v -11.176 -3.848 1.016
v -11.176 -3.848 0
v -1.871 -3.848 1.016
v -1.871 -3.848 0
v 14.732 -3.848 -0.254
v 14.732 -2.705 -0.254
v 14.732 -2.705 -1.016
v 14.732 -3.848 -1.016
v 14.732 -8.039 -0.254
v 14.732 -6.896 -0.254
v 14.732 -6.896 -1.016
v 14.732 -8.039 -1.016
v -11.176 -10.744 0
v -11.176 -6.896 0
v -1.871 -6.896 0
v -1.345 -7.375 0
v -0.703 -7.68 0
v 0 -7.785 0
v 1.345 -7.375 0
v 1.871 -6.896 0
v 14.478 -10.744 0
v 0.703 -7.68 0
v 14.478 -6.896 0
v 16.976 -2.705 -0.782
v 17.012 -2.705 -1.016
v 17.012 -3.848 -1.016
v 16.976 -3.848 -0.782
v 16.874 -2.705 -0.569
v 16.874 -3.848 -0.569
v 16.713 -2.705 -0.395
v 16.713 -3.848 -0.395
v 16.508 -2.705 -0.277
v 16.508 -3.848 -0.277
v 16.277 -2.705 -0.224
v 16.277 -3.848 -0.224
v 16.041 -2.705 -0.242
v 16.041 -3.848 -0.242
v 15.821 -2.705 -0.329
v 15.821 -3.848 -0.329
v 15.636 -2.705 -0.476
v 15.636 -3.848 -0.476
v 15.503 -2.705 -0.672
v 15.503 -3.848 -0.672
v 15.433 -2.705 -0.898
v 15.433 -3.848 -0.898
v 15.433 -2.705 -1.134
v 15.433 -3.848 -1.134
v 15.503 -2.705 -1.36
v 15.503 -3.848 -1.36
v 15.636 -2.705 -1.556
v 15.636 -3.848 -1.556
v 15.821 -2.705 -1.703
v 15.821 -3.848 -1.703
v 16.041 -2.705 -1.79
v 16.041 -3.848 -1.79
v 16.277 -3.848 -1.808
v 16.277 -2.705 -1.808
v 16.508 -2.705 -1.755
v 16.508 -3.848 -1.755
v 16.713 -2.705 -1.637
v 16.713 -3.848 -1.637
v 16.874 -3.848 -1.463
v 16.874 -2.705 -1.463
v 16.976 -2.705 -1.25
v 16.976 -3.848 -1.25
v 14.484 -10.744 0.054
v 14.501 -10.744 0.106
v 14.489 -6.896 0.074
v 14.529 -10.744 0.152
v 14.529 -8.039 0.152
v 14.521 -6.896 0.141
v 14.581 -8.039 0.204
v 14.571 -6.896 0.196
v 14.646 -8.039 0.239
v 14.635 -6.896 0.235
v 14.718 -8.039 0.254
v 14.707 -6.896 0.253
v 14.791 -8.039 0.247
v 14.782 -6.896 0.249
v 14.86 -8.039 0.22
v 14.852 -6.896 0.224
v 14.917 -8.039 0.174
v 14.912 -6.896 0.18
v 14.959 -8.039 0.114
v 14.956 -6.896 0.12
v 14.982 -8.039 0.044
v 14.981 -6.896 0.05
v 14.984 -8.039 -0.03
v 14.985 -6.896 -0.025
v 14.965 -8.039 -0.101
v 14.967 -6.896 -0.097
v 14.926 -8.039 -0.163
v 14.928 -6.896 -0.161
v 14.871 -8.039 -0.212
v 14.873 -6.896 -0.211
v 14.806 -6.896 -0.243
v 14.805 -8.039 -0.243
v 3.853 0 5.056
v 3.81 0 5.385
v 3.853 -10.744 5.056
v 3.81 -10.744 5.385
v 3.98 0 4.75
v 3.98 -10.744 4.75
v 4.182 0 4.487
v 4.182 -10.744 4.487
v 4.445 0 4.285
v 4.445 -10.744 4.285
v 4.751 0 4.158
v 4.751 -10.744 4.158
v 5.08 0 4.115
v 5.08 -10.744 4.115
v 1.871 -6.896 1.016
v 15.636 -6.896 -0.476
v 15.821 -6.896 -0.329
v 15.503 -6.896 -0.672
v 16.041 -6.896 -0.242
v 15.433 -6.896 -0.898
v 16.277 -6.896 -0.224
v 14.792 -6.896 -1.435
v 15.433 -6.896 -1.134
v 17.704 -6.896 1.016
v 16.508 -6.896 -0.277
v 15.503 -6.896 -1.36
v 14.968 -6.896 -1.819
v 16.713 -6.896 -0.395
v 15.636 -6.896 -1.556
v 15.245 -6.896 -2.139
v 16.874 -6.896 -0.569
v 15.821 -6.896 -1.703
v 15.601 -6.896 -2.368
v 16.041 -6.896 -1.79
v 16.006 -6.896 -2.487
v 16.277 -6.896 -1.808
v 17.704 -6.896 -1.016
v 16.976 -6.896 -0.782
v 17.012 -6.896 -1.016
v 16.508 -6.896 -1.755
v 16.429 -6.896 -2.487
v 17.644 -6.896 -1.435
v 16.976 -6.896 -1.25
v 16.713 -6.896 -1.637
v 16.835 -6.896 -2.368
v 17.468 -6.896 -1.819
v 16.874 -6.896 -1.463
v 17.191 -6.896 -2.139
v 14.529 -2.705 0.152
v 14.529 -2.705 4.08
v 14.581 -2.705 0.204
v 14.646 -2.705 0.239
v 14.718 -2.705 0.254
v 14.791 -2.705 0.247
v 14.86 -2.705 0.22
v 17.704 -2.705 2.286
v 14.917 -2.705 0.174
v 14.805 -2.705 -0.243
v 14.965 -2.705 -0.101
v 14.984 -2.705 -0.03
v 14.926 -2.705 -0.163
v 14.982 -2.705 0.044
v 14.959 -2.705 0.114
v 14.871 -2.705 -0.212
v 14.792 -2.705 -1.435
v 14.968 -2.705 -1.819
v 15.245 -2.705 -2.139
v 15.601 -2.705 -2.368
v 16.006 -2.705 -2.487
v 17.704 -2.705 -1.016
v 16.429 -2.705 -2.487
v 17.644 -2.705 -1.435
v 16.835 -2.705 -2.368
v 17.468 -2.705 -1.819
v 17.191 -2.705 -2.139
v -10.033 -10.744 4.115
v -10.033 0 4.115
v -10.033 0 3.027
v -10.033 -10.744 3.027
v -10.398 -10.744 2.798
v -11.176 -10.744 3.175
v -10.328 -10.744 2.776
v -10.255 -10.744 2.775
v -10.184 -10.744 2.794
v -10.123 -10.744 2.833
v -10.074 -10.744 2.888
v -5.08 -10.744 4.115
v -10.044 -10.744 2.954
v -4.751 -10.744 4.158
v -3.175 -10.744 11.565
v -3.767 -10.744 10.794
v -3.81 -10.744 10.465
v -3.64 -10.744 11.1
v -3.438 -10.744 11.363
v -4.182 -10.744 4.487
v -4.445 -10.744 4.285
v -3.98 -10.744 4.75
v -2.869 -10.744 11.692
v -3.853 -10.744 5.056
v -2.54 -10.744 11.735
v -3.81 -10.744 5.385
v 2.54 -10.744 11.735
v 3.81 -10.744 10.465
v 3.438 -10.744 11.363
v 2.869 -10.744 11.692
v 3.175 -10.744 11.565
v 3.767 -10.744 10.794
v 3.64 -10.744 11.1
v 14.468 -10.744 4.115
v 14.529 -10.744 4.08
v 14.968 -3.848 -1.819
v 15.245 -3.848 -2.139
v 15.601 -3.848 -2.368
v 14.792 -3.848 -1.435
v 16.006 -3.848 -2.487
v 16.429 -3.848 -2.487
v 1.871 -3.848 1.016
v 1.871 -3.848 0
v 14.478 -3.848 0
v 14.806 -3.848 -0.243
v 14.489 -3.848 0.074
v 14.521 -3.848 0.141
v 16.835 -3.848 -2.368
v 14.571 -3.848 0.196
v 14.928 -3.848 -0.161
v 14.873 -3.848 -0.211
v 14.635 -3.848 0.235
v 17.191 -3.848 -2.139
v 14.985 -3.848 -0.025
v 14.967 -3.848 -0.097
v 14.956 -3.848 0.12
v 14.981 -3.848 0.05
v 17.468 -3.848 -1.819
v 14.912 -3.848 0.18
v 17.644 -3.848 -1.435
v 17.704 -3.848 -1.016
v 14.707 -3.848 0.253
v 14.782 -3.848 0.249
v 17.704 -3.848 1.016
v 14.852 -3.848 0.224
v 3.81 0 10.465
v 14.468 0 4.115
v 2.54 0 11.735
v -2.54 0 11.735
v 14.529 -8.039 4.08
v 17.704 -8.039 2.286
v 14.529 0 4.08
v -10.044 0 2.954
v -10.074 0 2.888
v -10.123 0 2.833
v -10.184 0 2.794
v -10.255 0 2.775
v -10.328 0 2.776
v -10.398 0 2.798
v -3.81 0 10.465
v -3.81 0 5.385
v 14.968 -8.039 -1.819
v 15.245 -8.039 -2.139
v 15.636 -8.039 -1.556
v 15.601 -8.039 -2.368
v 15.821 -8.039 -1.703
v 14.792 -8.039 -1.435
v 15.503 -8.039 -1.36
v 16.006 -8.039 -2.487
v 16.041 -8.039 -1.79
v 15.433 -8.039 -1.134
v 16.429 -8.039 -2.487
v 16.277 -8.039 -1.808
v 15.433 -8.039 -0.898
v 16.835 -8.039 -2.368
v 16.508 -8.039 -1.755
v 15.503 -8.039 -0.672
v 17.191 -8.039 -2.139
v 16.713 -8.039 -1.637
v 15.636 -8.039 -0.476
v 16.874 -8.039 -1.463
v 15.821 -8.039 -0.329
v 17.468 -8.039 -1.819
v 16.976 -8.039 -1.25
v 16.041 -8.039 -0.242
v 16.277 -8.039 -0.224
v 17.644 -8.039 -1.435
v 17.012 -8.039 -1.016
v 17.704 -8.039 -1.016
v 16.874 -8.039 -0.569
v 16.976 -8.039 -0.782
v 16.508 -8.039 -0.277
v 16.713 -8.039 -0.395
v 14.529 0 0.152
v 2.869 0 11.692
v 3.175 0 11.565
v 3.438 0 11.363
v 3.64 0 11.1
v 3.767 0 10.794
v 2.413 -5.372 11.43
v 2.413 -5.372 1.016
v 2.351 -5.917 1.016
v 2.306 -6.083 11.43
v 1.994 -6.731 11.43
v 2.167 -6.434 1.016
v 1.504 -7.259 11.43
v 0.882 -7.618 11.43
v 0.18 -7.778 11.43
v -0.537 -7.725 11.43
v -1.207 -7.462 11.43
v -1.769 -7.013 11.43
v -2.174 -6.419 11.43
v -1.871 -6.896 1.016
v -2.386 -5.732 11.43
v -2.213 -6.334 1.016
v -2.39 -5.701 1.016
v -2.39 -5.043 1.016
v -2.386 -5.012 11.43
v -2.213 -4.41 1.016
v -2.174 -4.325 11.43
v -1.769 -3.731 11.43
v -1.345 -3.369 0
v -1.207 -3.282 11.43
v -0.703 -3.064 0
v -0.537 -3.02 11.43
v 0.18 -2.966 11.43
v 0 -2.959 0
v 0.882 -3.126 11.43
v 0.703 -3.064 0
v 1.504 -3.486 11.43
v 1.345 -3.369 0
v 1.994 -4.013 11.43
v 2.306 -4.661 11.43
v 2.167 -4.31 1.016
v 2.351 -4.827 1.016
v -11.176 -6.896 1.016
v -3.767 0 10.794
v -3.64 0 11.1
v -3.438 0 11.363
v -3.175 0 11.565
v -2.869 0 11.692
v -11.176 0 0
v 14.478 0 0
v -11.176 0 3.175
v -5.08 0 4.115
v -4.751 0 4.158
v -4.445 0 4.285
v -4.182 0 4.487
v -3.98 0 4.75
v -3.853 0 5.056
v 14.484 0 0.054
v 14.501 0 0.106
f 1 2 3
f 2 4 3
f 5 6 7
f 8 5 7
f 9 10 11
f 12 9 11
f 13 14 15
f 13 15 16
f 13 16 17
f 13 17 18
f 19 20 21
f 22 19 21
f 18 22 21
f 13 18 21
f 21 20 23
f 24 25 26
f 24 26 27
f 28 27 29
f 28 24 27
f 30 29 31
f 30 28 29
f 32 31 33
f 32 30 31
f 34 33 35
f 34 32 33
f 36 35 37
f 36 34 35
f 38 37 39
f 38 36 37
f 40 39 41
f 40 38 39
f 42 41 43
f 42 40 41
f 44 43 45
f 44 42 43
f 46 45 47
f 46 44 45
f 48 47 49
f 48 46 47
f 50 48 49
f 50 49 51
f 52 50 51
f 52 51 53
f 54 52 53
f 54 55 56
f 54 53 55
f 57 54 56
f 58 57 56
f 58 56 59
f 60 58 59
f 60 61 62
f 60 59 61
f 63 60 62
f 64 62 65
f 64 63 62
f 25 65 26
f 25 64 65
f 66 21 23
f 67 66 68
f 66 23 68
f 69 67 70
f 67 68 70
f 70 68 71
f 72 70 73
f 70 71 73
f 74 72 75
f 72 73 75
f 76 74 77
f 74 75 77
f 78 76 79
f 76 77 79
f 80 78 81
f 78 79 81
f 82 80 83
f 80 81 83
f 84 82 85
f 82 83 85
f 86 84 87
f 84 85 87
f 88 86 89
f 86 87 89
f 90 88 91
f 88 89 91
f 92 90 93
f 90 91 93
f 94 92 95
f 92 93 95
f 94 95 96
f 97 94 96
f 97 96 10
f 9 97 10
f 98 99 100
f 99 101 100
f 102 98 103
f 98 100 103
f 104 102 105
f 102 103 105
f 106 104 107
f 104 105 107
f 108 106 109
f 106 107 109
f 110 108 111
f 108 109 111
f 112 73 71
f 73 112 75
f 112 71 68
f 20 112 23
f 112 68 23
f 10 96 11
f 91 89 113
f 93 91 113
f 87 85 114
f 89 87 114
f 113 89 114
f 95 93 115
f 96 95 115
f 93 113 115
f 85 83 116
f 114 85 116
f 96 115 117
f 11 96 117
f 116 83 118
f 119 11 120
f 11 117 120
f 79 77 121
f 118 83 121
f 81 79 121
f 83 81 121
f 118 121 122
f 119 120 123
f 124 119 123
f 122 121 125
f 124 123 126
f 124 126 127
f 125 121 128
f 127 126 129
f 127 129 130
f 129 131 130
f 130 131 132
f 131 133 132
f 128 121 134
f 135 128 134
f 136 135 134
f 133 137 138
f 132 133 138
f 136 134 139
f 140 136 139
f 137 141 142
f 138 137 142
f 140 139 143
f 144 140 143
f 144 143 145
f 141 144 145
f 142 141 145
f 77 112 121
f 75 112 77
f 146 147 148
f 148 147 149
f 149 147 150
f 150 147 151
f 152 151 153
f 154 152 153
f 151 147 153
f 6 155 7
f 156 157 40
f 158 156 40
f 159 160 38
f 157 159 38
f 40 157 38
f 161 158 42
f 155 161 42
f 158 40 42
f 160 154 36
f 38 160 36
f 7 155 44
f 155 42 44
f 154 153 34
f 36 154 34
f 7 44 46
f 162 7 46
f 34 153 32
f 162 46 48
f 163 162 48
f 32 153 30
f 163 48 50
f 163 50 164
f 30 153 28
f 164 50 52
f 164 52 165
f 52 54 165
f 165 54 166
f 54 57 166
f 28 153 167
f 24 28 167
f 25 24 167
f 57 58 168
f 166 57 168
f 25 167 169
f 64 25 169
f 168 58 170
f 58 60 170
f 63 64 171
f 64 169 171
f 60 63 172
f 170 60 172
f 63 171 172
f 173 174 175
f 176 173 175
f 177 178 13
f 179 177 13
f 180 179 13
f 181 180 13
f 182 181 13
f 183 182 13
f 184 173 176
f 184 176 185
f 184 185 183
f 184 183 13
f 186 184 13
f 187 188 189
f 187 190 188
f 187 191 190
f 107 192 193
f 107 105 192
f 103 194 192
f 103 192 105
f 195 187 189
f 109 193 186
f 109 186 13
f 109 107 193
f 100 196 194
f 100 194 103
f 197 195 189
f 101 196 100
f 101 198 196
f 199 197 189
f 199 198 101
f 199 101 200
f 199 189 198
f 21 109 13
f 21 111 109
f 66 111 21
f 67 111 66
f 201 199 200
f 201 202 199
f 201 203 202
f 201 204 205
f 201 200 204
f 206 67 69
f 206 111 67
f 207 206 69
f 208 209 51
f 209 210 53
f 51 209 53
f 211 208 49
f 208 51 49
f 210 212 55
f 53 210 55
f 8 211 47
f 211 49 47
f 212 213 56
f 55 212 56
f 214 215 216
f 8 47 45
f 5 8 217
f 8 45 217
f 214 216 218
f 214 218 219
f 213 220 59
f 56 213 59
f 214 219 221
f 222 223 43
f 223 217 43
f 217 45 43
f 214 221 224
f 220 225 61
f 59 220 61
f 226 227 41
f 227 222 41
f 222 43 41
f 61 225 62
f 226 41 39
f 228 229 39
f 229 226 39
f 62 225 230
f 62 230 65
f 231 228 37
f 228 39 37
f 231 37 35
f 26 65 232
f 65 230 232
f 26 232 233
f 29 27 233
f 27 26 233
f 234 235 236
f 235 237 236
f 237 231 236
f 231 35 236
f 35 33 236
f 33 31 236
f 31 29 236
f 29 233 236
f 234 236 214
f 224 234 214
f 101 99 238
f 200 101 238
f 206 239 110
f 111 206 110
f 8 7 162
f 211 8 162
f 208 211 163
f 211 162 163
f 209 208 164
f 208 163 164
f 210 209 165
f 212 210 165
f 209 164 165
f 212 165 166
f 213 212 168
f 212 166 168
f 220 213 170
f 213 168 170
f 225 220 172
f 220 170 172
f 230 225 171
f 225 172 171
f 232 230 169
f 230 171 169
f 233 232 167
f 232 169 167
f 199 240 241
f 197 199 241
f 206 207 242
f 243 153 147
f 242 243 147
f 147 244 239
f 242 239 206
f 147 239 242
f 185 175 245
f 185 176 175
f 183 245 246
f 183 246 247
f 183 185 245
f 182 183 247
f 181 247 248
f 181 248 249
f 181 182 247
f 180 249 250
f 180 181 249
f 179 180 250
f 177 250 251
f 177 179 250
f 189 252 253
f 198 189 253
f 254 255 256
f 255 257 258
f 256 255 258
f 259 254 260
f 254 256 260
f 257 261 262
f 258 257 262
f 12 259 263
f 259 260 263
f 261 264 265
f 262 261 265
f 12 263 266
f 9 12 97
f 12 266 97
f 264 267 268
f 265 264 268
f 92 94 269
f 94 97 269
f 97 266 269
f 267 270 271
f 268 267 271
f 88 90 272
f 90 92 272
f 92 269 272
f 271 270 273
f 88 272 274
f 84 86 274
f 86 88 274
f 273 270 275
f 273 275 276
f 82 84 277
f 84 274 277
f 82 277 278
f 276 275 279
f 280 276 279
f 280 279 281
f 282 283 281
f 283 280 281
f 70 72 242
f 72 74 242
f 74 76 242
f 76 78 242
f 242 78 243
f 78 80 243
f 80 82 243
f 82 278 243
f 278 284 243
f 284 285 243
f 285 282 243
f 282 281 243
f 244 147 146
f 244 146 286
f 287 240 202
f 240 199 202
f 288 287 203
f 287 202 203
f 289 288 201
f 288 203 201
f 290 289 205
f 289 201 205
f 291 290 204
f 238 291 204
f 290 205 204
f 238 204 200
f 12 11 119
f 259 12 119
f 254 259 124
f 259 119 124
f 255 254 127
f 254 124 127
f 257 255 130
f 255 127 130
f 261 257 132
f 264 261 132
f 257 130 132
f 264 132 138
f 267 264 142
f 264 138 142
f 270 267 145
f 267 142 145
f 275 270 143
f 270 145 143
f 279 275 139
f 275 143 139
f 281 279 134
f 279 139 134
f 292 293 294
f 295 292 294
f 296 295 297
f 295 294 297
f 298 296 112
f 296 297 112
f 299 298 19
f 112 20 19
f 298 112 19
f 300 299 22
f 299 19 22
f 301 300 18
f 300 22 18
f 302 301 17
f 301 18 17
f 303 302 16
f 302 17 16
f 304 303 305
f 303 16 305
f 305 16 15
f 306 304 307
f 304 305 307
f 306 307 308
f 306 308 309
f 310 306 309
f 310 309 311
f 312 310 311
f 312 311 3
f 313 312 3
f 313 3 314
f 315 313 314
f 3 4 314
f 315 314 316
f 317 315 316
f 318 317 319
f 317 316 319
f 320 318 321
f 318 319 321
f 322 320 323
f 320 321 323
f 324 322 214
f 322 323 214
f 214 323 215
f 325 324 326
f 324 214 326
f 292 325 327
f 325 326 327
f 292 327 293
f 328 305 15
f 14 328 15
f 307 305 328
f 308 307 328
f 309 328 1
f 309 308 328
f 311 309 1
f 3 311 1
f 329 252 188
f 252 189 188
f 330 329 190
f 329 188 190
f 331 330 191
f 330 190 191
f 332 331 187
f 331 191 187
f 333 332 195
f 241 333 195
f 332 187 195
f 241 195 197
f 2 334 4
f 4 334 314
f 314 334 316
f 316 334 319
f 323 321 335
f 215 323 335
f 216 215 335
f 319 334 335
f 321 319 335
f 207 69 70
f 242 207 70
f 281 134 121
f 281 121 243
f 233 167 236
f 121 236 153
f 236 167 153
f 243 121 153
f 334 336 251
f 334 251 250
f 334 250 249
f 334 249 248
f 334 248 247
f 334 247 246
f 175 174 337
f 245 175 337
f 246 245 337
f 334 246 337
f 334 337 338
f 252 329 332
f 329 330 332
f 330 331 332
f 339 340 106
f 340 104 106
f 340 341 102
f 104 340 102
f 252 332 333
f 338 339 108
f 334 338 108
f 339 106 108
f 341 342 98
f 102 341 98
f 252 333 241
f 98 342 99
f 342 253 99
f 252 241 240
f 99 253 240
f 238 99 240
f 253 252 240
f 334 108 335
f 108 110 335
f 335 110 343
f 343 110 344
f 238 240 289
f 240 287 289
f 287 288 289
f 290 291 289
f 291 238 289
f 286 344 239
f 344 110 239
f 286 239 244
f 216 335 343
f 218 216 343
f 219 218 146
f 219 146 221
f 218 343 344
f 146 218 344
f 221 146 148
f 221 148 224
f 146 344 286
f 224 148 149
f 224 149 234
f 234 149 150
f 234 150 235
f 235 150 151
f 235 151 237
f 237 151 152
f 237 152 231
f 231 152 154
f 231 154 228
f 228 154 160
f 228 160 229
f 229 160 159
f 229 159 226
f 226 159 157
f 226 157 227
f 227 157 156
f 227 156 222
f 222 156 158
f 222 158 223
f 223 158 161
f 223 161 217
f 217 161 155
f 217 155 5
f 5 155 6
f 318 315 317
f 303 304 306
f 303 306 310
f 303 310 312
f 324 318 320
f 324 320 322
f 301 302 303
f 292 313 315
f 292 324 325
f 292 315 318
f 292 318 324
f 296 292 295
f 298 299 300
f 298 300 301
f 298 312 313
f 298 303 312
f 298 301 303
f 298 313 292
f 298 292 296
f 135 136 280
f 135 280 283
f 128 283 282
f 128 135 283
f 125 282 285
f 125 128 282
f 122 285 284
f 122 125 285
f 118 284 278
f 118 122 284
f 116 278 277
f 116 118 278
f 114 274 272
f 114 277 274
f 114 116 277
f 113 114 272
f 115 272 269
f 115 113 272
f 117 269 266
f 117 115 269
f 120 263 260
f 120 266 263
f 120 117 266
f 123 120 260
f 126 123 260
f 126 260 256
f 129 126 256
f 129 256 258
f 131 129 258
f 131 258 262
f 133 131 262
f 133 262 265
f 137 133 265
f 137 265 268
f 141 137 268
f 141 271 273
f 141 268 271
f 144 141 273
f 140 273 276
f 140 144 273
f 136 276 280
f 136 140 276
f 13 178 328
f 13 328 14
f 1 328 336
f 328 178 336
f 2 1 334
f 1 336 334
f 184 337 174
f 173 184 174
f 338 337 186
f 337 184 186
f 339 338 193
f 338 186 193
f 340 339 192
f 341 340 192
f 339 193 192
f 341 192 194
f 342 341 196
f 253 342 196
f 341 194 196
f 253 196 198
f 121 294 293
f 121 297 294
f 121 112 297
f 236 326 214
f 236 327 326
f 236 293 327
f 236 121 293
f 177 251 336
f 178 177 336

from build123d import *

# Parameters (mm, degrees)
F0_R     = 0.79375
F1_DEPTH = 10.7442
F2_W     = 2.7051
F2_H     = 1.8288
F2_H_2   = 3.302
F2_H_3   = 1.4859
F3_DEPTH = 3.175
F4_R     = 2.413
F5_DEPTH = 11.43
F6_R     = 1.27
F7_R     = 0.254
F8_W     = 3.048
F8_H     = 2.032
F8_H_2   = 1.4859
F9_DEPTH = 28.8808


with BuildPart() as f1:
    # F0 (on Front) → F1 (new body)
    with BuildSketch(Plane.XZ):
        with BuildLine():
            Line((-11.176, 3.175), (-11.176, 0))
            Line((-11.176, 0), (14.478, 0))
            ThreePointArc((14.478, 0), (14.9116051224, 0.1796051224), (14.732, -0.254))
            Line((14.732, -0.254), (14.732, -1.016))
            ThreePointArc((14.732, -1.016), (16.2179, -2.5019), (17.7038, -1.016))
            Line((17.7038, -1.016), (17.7038, 2.286))
            Line((17.7038, 2.286), (14.4678382203, 4.1148))
            Line((14.4678382203, 4.1148), (3.81, 4.1148))
            Line((3.81, 4.1148), (3.81, 11.7348))
            Line((3.81, 11.7348), (-3.81, 11.7348))
            Line((-3.81, 11.7348), (-3.81, 4.1148))
            Line((-3.81, 4.1148), (-10.033, 4.1148))
            Line((-10.033, 4.1148), (-10.033, 2.6214198342))
            Line((-10.033, 2.6214198342), (-11.176, 3.175))
        make_face()
        with Locations((16.2179, -1.016)):
            Circle(F0_R, mode=Mode.SUBTRACT)
    extrude(amount=F1_DEPTH)

    # F2 (on face) → F3 (cut)
    with BuildSketch(Plane.YZ.offset(17.7038)):
        with Locations((-9.39165, 3.2004)):
            Rectangle(F2_W, F2_H)
        with Locations((-9.39165, 0.635)):
            Rectangle(F2_W, F2_H_2)
        with Locations((-9.39165, -1.75895)):
            Rectangle(F2_W, F2_H_3)
        with Locations((-1.35255, 3.2004)):
            Rectangle(F2_W, F2_H)
        with Locations((-1.35255, 0.635)):
            Rectangle(F2_W, F2_H_2)
        with Locations((-1.35255, -1.75895)):
            Rectangle(F2_W, F2_H_3)
    extrude(amount=-F3_DEPTH, mode=Mode.SUBTRACT)

    # F4 (on face) → F5 (cut)
    with BuildSketch(Plane(origin=(0, 0, 0), x_dir=(1, 0, 0), z_dir=(0, 0, -1))):
        with Locations((0, 5.3721)):
            Circle(F4_R)
    extrude(amount=-F5_DEPTH, mode=Mode.SUBTRACT)

    # F6
    f6_edges = [f1.edges().sort_by_distance(p)[0] for p in [
        (-3.81, -5.3721, 4.1148),
        (3.81, -5.3721, 4.1148),
        (-3.81, -5.3721, 11.7348),
        (3.81, -5.3721, 11.7348),
    ]]
    fillet(f6_edges, radius=F6_R)

    # F7
    f7_edges = [f1.edges().sort_by_distance(p)[0] for p in [
        (-10.033, -5.3721, 2.62142),
    ]]
    fillet(f7_edges, radius=F7_R)

    # F8 (on face) → F9 (cut, through all)
    with BuildSketch(Plane.YZ.offset(17.7038)):
        with Locations((-5.3721, 0)):
            Rectangle(F8_W, F8_H)
        with Locations((-5.3721, -1.75895)):
            Rectangle(F8_W, F8_H_2)
    extrude(amount=-F9_DEPTH, mode=Mode.SUBTRACT)


solid = f1.part
